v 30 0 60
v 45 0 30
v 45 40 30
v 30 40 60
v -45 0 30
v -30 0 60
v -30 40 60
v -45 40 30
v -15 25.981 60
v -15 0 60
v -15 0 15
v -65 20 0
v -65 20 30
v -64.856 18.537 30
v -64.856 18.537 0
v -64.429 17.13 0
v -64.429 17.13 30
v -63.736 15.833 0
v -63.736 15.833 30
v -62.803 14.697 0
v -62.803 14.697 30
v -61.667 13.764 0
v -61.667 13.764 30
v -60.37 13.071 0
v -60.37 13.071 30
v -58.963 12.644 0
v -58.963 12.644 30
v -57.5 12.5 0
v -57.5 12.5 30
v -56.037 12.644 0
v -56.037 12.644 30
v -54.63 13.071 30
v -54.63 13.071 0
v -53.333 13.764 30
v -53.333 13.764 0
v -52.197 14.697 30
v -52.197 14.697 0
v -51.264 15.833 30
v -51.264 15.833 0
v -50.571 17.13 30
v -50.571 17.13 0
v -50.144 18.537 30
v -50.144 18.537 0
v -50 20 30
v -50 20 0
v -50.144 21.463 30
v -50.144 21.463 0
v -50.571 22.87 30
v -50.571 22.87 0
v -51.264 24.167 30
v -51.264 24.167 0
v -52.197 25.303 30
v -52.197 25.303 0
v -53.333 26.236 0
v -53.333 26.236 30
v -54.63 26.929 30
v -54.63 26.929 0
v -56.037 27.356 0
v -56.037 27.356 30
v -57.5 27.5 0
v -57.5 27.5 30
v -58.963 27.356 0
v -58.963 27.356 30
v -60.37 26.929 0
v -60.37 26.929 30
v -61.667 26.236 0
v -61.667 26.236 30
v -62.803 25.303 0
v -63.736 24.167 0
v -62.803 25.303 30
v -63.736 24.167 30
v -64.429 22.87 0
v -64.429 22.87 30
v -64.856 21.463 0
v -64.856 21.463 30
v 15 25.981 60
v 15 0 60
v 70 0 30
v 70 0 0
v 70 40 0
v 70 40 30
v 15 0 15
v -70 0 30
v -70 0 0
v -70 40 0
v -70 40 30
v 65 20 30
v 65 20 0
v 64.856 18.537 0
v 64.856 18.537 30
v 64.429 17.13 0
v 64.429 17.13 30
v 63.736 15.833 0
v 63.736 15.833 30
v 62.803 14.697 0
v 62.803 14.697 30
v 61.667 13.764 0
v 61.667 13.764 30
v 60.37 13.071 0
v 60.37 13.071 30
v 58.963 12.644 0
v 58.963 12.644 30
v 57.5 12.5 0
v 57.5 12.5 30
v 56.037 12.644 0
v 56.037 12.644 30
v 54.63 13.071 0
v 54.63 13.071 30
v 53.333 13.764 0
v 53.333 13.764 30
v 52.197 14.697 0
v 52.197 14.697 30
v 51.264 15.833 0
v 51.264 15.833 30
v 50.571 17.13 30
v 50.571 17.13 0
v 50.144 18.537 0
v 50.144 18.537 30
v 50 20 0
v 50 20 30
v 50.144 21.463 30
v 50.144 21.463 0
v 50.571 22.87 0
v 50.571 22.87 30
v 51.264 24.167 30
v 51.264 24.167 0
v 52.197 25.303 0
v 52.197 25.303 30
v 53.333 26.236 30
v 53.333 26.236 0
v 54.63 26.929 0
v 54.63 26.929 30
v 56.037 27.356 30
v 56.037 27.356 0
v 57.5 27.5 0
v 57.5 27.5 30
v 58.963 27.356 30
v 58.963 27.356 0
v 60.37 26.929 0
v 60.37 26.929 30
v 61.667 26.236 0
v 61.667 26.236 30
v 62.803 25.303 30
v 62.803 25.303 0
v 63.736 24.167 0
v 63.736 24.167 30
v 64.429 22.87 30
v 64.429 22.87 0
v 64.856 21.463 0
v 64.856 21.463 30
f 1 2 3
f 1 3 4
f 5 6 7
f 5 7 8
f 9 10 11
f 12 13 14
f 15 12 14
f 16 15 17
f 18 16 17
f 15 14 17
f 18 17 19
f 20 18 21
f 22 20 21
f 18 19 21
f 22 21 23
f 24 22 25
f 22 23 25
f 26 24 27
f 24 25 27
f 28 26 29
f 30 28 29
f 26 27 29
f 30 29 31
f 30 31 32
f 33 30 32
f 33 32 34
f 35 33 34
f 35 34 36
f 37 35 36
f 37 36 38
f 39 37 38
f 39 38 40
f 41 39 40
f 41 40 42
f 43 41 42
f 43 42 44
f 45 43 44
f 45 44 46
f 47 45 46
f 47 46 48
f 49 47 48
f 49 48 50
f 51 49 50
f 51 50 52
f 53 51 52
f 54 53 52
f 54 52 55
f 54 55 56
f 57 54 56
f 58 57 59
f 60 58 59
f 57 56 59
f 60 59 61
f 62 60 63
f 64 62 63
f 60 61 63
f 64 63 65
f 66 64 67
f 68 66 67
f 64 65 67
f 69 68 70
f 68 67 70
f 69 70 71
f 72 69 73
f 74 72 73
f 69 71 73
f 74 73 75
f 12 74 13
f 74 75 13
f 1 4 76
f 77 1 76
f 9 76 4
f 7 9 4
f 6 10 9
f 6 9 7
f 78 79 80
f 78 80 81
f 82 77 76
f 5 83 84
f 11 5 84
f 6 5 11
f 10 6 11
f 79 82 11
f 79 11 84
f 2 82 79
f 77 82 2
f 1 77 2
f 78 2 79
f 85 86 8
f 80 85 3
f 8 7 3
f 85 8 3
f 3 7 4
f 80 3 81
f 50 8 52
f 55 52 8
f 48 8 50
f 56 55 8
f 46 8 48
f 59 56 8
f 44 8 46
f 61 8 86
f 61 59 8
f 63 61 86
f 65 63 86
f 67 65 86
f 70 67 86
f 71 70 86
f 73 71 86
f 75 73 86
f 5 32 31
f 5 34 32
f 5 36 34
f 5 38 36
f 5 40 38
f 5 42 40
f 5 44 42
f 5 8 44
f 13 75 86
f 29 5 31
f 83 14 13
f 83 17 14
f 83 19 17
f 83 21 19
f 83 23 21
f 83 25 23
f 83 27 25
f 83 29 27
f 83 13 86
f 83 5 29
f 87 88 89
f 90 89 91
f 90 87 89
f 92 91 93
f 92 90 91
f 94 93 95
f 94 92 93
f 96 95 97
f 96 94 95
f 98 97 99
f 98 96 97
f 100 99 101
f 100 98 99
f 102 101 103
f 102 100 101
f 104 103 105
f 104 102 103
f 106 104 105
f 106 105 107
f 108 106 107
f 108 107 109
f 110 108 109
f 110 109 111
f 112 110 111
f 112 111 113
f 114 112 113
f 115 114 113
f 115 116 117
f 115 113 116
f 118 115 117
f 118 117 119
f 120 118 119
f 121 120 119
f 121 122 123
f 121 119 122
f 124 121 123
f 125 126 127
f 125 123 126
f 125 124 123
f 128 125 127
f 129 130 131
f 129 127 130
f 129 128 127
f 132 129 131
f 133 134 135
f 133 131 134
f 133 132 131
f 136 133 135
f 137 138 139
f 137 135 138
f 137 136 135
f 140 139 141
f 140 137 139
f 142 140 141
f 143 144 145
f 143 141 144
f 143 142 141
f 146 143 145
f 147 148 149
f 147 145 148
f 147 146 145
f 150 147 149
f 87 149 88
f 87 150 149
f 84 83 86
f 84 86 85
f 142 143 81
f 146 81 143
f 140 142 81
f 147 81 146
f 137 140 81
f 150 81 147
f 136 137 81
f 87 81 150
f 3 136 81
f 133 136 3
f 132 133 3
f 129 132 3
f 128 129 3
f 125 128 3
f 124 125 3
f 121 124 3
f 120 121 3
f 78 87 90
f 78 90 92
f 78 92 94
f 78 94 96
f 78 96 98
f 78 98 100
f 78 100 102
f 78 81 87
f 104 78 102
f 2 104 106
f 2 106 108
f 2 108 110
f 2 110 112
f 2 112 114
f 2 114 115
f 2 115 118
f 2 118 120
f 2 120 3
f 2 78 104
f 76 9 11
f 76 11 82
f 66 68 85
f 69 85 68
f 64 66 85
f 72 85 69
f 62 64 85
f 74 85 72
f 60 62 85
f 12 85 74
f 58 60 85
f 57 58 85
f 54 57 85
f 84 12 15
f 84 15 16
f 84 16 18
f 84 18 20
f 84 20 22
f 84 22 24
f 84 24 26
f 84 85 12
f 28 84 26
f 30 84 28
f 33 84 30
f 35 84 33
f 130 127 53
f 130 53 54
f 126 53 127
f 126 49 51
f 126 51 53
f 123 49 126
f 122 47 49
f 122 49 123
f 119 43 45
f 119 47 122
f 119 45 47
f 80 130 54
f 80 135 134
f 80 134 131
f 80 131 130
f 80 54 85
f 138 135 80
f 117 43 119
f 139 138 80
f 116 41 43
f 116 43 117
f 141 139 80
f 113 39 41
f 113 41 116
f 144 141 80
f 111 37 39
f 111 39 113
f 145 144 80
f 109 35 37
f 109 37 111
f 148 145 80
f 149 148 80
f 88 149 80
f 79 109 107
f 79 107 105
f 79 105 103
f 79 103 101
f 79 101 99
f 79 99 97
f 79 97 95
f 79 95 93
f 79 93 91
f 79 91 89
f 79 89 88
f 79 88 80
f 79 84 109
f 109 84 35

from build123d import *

# Parameters (mm, degrees)
SKETCH002_W  = 30
SKETCH002_H  = 40
PAD001_DEPTH = 85
PAD_DEPTH    = 40
SKETCH001_R  = 7.5
POCKET_DEPTH = 344.961315


with BuildPart() as pad001:
    # Sketch002 → Pad001 (new body)
    with BuildSketch(Plane(origin=(0, 0, 15), x_dir=(1, 0, 0), z_dir=(0, 0.5, 0.866025))):
        with Locations((0, -20)):
            Rectangle(SKETCH002_W, SKETCH002_H)
    extrude(amount=PAD001_DEPTH)


with BuildPart() as cut:
    # Sketch → Pad (new body)
    with BuildSketch(Plane.XZ):
        Polygon((-70, 0), (70, 0), (70, 30), (45, 30), (30, 60), (-30, 60), (-45, 30), (-70, 30), align=None)
    extrude(amount=-PAD_DEPTH)

    # Sketch001 → Pocket (cut, through all)
    with BuildSketch(Plane(origin=(0, 0, 30), x_dir=(-1, 0, 0), z_dir=(0, 0, 1))):
        with Locations((57.5, -20)):
            Circle(SKETCH001_R)
    pocket = extrude(amount=-POCKET_DEPTH, mode=Mode.SUBTRACT)

    # Mirrored: Pocket across Sketch001 V_Axis
    add(pocket.mirror(Plane(origin=(0, 0, 30), x_dir=(0, 0, 1), z_dir=(-1, 0, 0))), mode=Mode.SUBTRACT)

    # Cut: cut Pad001
    add(pad001.part, mode=Mode.SUBTRACT)


solid = cut.part
